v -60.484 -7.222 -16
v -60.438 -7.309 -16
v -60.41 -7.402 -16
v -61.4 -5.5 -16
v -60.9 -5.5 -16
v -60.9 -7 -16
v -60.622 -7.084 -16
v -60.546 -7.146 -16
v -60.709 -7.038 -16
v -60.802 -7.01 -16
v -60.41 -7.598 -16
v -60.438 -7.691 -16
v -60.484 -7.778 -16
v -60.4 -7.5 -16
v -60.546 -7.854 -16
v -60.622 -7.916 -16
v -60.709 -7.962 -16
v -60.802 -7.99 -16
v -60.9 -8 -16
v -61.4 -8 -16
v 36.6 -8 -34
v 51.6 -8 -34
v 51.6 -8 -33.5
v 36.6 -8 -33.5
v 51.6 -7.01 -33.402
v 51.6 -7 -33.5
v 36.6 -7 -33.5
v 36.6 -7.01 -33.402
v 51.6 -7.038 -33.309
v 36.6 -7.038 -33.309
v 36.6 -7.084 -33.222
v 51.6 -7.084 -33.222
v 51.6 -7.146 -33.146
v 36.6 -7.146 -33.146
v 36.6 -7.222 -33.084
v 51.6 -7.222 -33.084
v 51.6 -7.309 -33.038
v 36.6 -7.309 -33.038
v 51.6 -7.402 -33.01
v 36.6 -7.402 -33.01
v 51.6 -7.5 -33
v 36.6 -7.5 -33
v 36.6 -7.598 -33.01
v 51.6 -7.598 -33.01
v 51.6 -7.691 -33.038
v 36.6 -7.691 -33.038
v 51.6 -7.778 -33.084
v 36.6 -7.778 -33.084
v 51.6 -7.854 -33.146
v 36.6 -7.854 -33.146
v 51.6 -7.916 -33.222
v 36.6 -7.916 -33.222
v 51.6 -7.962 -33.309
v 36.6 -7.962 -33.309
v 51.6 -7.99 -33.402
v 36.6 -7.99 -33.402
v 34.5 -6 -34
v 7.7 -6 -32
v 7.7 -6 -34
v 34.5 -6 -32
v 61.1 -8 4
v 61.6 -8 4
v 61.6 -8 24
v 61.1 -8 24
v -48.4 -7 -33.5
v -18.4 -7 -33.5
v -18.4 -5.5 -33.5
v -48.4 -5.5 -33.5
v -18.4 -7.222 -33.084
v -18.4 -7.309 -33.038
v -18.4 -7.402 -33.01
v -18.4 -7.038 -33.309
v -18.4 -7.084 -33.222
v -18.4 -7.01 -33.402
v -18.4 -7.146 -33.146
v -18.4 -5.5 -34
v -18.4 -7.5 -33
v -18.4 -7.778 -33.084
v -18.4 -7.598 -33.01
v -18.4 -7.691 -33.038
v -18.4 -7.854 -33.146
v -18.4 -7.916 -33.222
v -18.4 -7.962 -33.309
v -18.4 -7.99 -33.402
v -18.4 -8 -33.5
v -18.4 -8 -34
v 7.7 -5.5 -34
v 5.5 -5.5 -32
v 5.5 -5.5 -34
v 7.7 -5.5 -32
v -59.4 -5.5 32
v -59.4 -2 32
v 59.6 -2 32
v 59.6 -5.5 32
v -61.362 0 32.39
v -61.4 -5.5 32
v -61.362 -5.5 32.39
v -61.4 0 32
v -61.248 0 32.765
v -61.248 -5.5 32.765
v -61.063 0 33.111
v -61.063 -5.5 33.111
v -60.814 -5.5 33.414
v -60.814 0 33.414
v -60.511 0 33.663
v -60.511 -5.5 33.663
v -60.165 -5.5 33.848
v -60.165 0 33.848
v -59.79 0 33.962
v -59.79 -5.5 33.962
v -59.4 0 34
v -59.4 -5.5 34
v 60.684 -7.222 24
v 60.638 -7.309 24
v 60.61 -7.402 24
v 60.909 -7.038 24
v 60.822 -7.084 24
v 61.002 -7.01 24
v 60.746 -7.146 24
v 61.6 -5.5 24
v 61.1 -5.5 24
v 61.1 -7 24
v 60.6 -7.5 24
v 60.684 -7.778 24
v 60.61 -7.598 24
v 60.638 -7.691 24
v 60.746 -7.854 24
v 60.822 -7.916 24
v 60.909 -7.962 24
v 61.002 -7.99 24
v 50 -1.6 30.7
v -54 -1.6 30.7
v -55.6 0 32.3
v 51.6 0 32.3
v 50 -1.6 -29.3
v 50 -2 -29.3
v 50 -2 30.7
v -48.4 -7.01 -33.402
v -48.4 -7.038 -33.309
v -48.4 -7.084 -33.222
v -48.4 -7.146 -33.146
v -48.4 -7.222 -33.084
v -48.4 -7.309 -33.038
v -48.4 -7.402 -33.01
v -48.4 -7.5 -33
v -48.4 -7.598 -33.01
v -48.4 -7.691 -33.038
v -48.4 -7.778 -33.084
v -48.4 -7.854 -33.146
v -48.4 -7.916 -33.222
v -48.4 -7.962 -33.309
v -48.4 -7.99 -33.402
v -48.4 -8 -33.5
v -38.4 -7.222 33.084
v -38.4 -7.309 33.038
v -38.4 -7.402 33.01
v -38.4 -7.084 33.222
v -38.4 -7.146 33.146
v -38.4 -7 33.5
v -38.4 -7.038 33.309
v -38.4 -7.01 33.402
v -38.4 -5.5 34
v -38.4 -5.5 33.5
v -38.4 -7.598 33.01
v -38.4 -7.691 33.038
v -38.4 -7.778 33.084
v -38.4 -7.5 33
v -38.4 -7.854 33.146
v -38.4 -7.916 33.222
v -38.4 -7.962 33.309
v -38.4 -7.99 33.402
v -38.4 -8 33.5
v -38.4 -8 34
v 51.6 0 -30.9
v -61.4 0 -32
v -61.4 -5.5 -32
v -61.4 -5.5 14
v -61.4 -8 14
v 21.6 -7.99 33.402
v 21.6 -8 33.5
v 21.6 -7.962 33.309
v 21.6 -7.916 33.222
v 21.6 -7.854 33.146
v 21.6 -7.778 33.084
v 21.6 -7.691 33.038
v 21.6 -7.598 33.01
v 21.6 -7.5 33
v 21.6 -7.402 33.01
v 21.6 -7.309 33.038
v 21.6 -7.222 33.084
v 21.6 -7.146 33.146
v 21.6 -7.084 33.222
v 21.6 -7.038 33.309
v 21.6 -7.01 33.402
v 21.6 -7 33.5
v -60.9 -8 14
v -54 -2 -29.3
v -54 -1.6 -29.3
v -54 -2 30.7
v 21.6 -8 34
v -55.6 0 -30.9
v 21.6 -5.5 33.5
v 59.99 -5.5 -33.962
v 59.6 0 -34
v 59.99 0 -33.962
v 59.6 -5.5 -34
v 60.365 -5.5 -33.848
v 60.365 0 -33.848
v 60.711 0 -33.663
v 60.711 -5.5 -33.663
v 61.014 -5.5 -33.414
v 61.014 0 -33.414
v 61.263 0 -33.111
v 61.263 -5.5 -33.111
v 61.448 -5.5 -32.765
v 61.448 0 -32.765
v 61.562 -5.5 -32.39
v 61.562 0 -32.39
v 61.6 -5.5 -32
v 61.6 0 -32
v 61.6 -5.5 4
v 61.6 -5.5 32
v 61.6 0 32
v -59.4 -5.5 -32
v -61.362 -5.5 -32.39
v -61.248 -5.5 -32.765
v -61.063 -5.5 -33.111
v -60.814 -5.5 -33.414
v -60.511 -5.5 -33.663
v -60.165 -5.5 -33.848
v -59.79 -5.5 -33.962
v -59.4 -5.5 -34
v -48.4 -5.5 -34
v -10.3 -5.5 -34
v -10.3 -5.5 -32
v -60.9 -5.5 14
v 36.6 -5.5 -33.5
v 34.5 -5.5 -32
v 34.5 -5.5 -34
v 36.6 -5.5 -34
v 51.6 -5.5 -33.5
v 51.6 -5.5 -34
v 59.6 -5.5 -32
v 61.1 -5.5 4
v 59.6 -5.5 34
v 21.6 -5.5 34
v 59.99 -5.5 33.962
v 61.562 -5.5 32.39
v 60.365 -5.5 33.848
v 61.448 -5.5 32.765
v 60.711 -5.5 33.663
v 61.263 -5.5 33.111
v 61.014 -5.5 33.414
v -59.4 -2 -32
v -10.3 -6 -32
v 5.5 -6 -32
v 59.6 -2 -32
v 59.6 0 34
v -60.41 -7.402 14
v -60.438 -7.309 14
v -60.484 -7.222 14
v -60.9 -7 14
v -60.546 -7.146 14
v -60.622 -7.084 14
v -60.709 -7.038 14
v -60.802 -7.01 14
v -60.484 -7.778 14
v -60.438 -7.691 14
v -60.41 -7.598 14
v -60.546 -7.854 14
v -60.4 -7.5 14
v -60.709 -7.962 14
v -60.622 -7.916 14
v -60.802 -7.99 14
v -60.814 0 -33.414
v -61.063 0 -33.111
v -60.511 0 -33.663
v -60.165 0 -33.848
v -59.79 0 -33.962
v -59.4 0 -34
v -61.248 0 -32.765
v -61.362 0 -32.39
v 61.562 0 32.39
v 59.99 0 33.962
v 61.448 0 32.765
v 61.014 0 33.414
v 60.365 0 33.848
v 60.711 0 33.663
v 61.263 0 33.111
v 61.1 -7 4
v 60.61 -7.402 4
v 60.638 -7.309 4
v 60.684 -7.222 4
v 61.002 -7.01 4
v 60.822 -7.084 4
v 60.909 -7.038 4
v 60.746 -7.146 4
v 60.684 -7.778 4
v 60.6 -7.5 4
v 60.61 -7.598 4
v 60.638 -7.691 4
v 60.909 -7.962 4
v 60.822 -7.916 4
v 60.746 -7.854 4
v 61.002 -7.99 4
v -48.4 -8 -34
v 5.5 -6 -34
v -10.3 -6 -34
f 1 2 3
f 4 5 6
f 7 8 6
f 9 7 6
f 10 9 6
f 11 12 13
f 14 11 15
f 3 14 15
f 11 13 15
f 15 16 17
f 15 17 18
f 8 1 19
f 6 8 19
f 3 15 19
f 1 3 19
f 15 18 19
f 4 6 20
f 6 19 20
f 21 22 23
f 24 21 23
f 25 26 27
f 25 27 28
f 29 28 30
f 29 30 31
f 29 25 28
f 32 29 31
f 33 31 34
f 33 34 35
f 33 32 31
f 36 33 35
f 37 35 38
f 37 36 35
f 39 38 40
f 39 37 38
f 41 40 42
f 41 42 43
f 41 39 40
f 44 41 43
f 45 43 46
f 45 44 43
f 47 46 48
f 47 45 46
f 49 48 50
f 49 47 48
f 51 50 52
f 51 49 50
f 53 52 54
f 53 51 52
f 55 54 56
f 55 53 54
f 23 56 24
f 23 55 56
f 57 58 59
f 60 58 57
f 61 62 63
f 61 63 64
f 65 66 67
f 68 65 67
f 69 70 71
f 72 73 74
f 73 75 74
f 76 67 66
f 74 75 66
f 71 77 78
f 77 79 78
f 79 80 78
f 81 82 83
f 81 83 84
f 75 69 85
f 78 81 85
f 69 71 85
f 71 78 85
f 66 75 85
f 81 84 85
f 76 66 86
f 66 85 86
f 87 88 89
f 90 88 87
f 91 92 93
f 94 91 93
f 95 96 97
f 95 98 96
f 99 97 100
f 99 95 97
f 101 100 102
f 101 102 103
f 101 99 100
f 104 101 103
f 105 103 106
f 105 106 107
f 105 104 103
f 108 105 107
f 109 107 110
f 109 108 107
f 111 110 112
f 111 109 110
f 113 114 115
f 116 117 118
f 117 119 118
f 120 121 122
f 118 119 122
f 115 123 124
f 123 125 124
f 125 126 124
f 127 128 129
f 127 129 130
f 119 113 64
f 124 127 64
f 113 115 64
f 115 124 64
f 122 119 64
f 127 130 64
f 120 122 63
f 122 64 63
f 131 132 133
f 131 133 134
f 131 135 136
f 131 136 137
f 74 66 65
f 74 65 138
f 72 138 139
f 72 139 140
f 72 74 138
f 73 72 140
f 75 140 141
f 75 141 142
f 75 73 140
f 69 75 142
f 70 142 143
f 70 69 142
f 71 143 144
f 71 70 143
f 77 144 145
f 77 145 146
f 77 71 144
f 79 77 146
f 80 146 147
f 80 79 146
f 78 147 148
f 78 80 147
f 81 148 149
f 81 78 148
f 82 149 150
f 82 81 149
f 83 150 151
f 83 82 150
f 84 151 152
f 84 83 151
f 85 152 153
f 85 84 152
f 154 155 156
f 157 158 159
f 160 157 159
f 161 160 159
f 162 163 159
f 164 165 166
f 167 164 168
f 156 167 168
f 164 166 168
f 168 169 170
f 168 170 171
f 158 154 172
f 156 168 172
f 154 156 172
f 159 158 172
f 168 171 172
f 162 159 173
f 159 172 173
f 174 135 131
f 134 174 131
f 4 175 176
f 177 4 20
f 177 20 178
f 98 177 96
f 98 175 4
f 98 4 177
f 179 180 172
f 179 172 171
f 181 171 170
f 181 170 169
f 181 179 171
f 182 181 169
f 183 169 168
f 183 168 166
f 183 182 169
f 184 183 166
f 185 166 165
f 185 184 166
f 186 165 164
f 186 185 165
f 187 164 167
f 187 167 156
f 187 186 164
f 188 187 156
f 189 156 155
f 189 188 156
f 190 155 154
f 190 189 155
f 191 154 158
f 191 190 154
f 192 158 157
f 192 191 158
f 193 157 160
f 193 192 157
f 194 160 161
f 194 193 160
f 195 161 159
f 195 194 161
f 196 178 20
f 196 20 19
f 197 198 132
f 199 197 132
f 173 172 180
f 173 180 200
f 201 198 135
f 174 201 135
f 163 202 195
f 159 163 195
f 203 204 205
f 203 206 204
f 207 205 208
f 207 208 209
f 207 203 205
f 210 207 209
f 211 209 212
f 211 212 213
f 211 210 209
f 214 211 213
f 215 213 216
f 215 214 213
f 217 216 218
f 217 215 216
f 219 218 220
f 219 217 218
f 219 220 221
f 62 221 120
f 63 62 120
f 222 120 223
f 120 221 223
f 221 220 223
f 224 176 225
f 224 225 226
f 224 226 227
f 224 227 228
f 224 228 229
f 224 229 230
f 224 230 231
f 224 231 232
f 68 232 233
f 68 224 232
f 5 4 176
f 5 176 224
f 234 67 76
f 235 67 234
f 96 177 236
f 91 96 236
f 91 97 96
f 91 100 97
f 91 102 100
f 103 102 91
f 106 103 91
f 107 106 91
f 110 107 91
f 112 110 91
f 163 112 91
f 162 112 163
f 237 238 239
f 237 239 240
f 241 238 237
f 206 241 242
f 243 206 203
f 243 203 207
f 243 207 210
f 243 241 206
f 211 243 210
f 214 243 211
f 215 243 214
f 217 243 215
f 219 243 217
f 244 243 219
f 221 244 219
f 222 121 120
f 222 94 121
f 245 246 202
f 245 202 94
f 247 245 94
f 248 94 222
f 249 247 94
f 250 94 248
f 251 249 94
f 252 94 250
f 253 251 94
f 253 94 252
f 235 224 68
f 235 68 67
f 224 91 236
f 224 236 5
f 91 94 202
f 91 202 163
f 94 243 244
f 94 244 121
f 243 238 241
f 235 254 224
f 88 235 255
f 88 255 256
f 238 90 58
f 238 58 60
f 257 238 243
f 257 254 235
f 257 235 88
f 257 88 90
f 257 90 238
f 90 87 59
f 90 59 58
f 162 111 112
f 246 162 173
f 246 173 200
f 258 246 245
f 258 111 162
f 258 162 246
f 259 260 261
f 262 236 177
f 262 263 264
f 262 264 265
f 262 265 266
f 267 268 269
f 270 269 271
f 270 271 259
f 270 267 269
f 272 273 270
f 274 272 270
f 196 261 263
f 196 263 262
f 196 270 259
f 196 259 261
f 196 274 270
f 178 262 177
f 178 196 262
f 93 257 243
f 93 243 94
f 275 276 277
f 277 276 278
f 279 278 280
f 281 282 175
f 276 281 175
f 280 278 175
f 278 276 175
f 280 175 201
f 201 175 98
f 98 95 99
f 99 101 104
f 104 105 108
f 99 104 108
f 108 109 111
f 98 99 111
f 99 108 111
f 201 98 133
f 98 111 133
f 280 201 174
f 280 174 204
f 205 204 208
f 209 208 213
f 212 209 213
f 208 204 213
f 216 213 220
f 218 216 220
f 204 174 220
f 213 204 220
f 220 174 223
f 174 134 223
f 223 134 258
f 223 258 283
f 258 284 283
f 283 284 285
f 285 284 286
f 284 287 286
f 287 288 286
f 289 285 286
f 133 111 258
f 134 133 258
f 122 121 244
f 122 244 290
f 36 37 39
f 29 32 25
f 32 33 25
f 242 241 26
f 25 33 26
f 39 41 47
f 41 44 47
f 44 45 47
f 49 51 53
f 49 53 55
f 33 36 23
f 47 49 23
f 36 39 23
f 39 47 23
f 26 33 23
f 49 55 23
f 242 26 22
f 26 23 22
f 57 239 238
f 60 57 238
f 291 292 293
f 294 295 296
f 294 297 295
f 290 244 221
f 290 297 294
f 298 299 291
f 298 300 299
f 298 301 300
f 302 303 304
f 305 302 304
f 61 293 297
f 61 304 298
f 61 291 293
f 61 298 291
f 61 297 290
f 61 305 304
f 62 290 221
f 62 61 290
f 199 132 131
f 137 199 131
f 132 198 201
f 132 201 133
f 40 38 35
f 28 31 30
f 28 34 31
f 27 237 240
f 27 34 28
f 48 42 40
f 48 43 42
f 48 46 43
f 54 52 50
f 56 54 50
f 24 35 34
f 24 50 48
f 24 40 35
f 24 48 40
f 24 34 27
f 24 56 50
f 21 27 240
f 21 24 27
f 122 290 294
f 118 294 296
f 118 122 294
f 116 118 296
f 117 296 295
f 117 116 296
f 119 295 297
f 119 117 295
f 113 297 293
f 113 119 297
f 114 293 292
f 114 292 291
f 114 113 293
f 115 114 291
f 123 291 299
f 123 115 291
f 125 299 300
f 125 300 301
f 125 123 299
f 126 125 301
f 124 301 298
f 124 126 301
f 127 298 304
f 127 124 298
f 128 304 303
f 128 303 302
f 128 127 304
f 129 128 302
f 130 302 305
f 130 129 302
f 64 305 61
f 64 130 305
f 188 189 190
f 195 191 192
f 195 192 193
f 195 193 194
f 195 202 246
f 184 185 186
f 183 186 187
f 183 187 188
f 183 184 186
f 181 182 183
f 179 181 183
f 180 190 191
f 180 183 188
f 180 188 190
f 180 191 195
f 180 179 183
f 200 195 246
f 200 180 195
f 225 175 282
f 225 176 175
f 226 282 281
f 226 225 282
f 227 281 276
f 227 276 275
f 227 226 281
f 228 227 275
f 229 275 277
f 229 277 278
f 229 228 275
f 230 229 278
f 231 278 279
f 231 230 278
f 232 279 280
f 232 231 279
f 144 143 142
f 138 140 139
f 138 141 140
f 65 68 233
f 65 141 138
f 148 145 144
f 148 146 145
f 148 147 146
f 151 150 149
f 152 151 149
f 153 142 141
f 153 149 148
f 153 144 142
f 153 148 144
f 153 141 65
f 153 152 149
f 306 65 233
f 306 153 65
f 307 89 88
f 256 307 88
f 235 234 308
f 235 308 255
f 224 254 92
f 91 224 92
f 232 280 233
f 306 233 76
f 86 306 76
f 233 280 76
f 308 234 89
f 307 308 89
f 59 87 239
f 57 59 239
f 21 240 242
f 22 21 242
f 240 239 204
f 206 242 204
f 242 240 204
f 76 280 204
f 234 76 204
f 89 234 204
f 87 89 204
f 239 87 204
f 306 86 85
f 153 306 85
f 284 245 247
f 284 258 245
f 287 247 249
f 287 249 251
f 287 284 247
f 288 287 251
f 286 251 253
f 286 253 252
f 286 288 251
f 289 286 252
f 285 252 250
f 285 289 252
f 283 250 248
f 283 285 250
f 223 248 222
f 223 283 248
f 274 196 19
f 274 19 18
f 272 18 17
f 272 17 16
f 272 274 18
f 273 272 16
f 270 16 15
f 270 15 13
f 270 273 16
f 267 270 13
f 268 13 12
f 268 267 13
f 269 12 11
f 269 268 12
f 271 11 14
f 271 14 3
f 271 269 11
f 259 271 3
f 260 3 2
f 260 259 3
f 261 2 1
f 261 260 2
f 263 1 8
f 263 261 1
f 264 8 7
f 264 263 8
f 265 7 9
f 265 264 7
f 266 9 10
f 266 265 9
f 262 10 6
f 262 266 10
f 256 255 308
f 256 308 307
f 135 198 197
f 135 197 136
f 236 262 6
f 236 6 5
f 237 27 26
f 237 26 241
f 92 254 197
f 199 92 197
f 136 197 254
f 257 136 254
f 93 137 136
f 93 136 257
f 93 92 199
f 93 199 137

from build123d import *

# Parameters (mm, degrees)
SKETCH_W      = 123
SKETCH_H      = 68
SKETCH_W_2    = 104
SKETCH_H_2    = 60
PAD_DEPTH     = 2
SKETCH001_W   = 123
SKETCH001_H   = 68
SKETCH001_W_2 = 119
SKETCH001_H_2 = 64
PAD001_DEPTH  = 3.5
PAD006_START  = -40
PAD006_DEPTH  = 60
PAD007_START  = -10
PAD007_DEPTH  = 20
PAD008_START  = -20
PAD008_DEPTH  = 30
PAD009_START  = -10
PAD009_DEPTH  = 15
PAD010_START  = -80
PAD010_DEPTH  = 30
SKETCH016_W   = 15.8
SKETCH016_H   = 2
SKETCH016_W_2 = 26.8
PAD014_DEPTH  = 0.5
FILLET_R      = 2
CHAMFER_SIZE  = 1.6


with BuildPart() as part:
    # Sketch → Pad (new body)
    with BuildSketch(Plane.XZ):
        with Locations((0.1, 0)):
            Rectangle(SKETCH_W, SKETCH_H)
        with Locations((-2, 0.7)):
            Rectangle(SKETCH_W_2, SKETCH_H_2, mode=Mode.SUBTRACT)
    extrude(amount=PAD_DEPTH)

    # Sketch001 (on Face10 of Pad) → Pad001 (join)
    with BuildSketch(Plane.XZ.offset(2)):
        with Locations((0.1, 0)):
            Rectangle(SKETCH001_W, SKETCH001_H)
        with Locations((0.1, 0)):
            Rectangle(SKETCH001_W_2, SKETCH001_H_2, mode=Mode.SUBTRACT)
    extrude(amount=PAD001_DEPTH)

    # Sketch008 (on Face7 of Pad001) → Pad006 (join)
    with BuildSketch(Plane(origin=(61.6, 0, 0), x_dir=(0, 0, 1), z_dir=(1, 0, 0)).offset(PAD006_START)):
        with BuildLine():
            Line((34, 5.5), (34, 8))
            Line((33.5, 8), (34, 8))
            ThreePointArc((33.5, 8), (33, 7.5), (33.5, 7))
            Line((33.5, 5.5), (33.5, 7))
            Line((33.5, 5.5), (34, 5.5))
        make_face()
    extrude(amount=-PAD006_DEPTH)

    # Sketch009 (on Face5 of Pad006) → Pad007 (join)
    with BuildSketch(Plane(origin=(0, 0, 34), x_dir=(-1, 0, 0), z_dir=(0, 0, 1)).offset(PAD007_START)):
        with BuildLine():
            Line((-61.1, 5.5), (-61.6, 5.5))
            Line((-61.6, 5.5), (-61.6, 8))
            Line((-61.6, 8), (-61.1, 8))
            ThreePointArc((-61.1, 7), (-60.6, 7.5), (-61.1, 8))
            Line((-61.1, 5.5), (-61.1, 7))
        make_face()
    extrude(amount=-PAD007_DEPTH)

    # Sketch010 (on Face5 of Pad007) → Pad008 (join)
    with BuildSketch(Plane(origin=(0, 0, 34), x_dir=(-1, 0, 0), z_dir=(0, 0, 1)).offset(PAD008_START)):
        with BuildLine():
            Line((60.9, 7), (60.9, 5.5))
            Line((60.9, 5.5), (61.4, 5.5))
            Line((61.4, 5.5), (61.4, 8))
            Line((61.4, 8), (60.9, 8))
            ThreePointArc((60.9, 8), (60.4, 7.5), (60.9, 7))
        make_face()
    extrude(amount=-PAD008_DEPTH)

    # Sketch011 (on Face7 of Pad008) → Pad009 (join)
    with BuildSketch(Plane(origin=(61.6, 0, 0), x_dir=(0, 0, 1), z_dir=(1, 0, 0)).offset(PAD009_START)):
        with BuildLine():
            Line((-33.5, 7), (-33.5, 5.5))
            Line((-33.5, 5.5), (-34, 5.5))
            Line((-34, 5.5), (-34, 8))
            Line((-34, 8), (-33.5, 8))
            ThreePointArc((-33.5, 7), (-33, 7.5), (-33.5, 8))
        make_face()
    extrude(amount=-PAD009_DEPTH)

    # Sketch011 (on Face7 of Pad008) → Pad010 (join)
    with BuildSketch(Plane(origin=(61.6, 0, 0), x_dir=(0, 0, 1), z_dir=(1, 0, 0)).offset(PAD010_START)):
        with BuildLine():
            Line((-33.5, 7), (-33.5, 5.5))
            Line((-33.5, 5.5), (-34, 5.5))
            Line((-34, 5.5), (-34, 8))
            Line((-34, 8), (-33.5, 8))
            ThreePointArc((-33.5, 7), (-33, 7.5), (-33.5, 8))
        make_face()
    extrude(amount=-PAD010_DEPTH)

    # Sketch016 (on Face13 of Pad010) → Pad014 (join)
    with BuildSketch(Plane.XZ.offset(5.5)):
        with Locations((-2.4, -33)):
            Rectangle(SKETCH016_W, SKETCH016_H)
        with Locations((21.1, -33)):
            Rectangle(SKETCH016_W_2, SKETCH016_H)
    extrude(amount=PAD014_DEPTH)

    # Fillet
    fillet_edges = [part.edges().sort_by_distance(p)[0] for p in [
        (61.6, -1, -34),
        (-61.4, -1, -34),
        (-61.4, -1, 34),
        (61.6, -1, 34),
    ]]
    fillet(fillet_edges, radius=FILLET_R)

    # Chamfer
    chamfer_edges = [part.edges().sort_by_distance(p)[0] for p in [
        (-54, 0, 0.7),
        (-2, 0, -29.3),
        (-2, 0, 30.7),
        (50, 0, 0.7),
    ]]
    chamfer(chamfer_edges, length=CHAMFER_SIZE)


solid = part.part
